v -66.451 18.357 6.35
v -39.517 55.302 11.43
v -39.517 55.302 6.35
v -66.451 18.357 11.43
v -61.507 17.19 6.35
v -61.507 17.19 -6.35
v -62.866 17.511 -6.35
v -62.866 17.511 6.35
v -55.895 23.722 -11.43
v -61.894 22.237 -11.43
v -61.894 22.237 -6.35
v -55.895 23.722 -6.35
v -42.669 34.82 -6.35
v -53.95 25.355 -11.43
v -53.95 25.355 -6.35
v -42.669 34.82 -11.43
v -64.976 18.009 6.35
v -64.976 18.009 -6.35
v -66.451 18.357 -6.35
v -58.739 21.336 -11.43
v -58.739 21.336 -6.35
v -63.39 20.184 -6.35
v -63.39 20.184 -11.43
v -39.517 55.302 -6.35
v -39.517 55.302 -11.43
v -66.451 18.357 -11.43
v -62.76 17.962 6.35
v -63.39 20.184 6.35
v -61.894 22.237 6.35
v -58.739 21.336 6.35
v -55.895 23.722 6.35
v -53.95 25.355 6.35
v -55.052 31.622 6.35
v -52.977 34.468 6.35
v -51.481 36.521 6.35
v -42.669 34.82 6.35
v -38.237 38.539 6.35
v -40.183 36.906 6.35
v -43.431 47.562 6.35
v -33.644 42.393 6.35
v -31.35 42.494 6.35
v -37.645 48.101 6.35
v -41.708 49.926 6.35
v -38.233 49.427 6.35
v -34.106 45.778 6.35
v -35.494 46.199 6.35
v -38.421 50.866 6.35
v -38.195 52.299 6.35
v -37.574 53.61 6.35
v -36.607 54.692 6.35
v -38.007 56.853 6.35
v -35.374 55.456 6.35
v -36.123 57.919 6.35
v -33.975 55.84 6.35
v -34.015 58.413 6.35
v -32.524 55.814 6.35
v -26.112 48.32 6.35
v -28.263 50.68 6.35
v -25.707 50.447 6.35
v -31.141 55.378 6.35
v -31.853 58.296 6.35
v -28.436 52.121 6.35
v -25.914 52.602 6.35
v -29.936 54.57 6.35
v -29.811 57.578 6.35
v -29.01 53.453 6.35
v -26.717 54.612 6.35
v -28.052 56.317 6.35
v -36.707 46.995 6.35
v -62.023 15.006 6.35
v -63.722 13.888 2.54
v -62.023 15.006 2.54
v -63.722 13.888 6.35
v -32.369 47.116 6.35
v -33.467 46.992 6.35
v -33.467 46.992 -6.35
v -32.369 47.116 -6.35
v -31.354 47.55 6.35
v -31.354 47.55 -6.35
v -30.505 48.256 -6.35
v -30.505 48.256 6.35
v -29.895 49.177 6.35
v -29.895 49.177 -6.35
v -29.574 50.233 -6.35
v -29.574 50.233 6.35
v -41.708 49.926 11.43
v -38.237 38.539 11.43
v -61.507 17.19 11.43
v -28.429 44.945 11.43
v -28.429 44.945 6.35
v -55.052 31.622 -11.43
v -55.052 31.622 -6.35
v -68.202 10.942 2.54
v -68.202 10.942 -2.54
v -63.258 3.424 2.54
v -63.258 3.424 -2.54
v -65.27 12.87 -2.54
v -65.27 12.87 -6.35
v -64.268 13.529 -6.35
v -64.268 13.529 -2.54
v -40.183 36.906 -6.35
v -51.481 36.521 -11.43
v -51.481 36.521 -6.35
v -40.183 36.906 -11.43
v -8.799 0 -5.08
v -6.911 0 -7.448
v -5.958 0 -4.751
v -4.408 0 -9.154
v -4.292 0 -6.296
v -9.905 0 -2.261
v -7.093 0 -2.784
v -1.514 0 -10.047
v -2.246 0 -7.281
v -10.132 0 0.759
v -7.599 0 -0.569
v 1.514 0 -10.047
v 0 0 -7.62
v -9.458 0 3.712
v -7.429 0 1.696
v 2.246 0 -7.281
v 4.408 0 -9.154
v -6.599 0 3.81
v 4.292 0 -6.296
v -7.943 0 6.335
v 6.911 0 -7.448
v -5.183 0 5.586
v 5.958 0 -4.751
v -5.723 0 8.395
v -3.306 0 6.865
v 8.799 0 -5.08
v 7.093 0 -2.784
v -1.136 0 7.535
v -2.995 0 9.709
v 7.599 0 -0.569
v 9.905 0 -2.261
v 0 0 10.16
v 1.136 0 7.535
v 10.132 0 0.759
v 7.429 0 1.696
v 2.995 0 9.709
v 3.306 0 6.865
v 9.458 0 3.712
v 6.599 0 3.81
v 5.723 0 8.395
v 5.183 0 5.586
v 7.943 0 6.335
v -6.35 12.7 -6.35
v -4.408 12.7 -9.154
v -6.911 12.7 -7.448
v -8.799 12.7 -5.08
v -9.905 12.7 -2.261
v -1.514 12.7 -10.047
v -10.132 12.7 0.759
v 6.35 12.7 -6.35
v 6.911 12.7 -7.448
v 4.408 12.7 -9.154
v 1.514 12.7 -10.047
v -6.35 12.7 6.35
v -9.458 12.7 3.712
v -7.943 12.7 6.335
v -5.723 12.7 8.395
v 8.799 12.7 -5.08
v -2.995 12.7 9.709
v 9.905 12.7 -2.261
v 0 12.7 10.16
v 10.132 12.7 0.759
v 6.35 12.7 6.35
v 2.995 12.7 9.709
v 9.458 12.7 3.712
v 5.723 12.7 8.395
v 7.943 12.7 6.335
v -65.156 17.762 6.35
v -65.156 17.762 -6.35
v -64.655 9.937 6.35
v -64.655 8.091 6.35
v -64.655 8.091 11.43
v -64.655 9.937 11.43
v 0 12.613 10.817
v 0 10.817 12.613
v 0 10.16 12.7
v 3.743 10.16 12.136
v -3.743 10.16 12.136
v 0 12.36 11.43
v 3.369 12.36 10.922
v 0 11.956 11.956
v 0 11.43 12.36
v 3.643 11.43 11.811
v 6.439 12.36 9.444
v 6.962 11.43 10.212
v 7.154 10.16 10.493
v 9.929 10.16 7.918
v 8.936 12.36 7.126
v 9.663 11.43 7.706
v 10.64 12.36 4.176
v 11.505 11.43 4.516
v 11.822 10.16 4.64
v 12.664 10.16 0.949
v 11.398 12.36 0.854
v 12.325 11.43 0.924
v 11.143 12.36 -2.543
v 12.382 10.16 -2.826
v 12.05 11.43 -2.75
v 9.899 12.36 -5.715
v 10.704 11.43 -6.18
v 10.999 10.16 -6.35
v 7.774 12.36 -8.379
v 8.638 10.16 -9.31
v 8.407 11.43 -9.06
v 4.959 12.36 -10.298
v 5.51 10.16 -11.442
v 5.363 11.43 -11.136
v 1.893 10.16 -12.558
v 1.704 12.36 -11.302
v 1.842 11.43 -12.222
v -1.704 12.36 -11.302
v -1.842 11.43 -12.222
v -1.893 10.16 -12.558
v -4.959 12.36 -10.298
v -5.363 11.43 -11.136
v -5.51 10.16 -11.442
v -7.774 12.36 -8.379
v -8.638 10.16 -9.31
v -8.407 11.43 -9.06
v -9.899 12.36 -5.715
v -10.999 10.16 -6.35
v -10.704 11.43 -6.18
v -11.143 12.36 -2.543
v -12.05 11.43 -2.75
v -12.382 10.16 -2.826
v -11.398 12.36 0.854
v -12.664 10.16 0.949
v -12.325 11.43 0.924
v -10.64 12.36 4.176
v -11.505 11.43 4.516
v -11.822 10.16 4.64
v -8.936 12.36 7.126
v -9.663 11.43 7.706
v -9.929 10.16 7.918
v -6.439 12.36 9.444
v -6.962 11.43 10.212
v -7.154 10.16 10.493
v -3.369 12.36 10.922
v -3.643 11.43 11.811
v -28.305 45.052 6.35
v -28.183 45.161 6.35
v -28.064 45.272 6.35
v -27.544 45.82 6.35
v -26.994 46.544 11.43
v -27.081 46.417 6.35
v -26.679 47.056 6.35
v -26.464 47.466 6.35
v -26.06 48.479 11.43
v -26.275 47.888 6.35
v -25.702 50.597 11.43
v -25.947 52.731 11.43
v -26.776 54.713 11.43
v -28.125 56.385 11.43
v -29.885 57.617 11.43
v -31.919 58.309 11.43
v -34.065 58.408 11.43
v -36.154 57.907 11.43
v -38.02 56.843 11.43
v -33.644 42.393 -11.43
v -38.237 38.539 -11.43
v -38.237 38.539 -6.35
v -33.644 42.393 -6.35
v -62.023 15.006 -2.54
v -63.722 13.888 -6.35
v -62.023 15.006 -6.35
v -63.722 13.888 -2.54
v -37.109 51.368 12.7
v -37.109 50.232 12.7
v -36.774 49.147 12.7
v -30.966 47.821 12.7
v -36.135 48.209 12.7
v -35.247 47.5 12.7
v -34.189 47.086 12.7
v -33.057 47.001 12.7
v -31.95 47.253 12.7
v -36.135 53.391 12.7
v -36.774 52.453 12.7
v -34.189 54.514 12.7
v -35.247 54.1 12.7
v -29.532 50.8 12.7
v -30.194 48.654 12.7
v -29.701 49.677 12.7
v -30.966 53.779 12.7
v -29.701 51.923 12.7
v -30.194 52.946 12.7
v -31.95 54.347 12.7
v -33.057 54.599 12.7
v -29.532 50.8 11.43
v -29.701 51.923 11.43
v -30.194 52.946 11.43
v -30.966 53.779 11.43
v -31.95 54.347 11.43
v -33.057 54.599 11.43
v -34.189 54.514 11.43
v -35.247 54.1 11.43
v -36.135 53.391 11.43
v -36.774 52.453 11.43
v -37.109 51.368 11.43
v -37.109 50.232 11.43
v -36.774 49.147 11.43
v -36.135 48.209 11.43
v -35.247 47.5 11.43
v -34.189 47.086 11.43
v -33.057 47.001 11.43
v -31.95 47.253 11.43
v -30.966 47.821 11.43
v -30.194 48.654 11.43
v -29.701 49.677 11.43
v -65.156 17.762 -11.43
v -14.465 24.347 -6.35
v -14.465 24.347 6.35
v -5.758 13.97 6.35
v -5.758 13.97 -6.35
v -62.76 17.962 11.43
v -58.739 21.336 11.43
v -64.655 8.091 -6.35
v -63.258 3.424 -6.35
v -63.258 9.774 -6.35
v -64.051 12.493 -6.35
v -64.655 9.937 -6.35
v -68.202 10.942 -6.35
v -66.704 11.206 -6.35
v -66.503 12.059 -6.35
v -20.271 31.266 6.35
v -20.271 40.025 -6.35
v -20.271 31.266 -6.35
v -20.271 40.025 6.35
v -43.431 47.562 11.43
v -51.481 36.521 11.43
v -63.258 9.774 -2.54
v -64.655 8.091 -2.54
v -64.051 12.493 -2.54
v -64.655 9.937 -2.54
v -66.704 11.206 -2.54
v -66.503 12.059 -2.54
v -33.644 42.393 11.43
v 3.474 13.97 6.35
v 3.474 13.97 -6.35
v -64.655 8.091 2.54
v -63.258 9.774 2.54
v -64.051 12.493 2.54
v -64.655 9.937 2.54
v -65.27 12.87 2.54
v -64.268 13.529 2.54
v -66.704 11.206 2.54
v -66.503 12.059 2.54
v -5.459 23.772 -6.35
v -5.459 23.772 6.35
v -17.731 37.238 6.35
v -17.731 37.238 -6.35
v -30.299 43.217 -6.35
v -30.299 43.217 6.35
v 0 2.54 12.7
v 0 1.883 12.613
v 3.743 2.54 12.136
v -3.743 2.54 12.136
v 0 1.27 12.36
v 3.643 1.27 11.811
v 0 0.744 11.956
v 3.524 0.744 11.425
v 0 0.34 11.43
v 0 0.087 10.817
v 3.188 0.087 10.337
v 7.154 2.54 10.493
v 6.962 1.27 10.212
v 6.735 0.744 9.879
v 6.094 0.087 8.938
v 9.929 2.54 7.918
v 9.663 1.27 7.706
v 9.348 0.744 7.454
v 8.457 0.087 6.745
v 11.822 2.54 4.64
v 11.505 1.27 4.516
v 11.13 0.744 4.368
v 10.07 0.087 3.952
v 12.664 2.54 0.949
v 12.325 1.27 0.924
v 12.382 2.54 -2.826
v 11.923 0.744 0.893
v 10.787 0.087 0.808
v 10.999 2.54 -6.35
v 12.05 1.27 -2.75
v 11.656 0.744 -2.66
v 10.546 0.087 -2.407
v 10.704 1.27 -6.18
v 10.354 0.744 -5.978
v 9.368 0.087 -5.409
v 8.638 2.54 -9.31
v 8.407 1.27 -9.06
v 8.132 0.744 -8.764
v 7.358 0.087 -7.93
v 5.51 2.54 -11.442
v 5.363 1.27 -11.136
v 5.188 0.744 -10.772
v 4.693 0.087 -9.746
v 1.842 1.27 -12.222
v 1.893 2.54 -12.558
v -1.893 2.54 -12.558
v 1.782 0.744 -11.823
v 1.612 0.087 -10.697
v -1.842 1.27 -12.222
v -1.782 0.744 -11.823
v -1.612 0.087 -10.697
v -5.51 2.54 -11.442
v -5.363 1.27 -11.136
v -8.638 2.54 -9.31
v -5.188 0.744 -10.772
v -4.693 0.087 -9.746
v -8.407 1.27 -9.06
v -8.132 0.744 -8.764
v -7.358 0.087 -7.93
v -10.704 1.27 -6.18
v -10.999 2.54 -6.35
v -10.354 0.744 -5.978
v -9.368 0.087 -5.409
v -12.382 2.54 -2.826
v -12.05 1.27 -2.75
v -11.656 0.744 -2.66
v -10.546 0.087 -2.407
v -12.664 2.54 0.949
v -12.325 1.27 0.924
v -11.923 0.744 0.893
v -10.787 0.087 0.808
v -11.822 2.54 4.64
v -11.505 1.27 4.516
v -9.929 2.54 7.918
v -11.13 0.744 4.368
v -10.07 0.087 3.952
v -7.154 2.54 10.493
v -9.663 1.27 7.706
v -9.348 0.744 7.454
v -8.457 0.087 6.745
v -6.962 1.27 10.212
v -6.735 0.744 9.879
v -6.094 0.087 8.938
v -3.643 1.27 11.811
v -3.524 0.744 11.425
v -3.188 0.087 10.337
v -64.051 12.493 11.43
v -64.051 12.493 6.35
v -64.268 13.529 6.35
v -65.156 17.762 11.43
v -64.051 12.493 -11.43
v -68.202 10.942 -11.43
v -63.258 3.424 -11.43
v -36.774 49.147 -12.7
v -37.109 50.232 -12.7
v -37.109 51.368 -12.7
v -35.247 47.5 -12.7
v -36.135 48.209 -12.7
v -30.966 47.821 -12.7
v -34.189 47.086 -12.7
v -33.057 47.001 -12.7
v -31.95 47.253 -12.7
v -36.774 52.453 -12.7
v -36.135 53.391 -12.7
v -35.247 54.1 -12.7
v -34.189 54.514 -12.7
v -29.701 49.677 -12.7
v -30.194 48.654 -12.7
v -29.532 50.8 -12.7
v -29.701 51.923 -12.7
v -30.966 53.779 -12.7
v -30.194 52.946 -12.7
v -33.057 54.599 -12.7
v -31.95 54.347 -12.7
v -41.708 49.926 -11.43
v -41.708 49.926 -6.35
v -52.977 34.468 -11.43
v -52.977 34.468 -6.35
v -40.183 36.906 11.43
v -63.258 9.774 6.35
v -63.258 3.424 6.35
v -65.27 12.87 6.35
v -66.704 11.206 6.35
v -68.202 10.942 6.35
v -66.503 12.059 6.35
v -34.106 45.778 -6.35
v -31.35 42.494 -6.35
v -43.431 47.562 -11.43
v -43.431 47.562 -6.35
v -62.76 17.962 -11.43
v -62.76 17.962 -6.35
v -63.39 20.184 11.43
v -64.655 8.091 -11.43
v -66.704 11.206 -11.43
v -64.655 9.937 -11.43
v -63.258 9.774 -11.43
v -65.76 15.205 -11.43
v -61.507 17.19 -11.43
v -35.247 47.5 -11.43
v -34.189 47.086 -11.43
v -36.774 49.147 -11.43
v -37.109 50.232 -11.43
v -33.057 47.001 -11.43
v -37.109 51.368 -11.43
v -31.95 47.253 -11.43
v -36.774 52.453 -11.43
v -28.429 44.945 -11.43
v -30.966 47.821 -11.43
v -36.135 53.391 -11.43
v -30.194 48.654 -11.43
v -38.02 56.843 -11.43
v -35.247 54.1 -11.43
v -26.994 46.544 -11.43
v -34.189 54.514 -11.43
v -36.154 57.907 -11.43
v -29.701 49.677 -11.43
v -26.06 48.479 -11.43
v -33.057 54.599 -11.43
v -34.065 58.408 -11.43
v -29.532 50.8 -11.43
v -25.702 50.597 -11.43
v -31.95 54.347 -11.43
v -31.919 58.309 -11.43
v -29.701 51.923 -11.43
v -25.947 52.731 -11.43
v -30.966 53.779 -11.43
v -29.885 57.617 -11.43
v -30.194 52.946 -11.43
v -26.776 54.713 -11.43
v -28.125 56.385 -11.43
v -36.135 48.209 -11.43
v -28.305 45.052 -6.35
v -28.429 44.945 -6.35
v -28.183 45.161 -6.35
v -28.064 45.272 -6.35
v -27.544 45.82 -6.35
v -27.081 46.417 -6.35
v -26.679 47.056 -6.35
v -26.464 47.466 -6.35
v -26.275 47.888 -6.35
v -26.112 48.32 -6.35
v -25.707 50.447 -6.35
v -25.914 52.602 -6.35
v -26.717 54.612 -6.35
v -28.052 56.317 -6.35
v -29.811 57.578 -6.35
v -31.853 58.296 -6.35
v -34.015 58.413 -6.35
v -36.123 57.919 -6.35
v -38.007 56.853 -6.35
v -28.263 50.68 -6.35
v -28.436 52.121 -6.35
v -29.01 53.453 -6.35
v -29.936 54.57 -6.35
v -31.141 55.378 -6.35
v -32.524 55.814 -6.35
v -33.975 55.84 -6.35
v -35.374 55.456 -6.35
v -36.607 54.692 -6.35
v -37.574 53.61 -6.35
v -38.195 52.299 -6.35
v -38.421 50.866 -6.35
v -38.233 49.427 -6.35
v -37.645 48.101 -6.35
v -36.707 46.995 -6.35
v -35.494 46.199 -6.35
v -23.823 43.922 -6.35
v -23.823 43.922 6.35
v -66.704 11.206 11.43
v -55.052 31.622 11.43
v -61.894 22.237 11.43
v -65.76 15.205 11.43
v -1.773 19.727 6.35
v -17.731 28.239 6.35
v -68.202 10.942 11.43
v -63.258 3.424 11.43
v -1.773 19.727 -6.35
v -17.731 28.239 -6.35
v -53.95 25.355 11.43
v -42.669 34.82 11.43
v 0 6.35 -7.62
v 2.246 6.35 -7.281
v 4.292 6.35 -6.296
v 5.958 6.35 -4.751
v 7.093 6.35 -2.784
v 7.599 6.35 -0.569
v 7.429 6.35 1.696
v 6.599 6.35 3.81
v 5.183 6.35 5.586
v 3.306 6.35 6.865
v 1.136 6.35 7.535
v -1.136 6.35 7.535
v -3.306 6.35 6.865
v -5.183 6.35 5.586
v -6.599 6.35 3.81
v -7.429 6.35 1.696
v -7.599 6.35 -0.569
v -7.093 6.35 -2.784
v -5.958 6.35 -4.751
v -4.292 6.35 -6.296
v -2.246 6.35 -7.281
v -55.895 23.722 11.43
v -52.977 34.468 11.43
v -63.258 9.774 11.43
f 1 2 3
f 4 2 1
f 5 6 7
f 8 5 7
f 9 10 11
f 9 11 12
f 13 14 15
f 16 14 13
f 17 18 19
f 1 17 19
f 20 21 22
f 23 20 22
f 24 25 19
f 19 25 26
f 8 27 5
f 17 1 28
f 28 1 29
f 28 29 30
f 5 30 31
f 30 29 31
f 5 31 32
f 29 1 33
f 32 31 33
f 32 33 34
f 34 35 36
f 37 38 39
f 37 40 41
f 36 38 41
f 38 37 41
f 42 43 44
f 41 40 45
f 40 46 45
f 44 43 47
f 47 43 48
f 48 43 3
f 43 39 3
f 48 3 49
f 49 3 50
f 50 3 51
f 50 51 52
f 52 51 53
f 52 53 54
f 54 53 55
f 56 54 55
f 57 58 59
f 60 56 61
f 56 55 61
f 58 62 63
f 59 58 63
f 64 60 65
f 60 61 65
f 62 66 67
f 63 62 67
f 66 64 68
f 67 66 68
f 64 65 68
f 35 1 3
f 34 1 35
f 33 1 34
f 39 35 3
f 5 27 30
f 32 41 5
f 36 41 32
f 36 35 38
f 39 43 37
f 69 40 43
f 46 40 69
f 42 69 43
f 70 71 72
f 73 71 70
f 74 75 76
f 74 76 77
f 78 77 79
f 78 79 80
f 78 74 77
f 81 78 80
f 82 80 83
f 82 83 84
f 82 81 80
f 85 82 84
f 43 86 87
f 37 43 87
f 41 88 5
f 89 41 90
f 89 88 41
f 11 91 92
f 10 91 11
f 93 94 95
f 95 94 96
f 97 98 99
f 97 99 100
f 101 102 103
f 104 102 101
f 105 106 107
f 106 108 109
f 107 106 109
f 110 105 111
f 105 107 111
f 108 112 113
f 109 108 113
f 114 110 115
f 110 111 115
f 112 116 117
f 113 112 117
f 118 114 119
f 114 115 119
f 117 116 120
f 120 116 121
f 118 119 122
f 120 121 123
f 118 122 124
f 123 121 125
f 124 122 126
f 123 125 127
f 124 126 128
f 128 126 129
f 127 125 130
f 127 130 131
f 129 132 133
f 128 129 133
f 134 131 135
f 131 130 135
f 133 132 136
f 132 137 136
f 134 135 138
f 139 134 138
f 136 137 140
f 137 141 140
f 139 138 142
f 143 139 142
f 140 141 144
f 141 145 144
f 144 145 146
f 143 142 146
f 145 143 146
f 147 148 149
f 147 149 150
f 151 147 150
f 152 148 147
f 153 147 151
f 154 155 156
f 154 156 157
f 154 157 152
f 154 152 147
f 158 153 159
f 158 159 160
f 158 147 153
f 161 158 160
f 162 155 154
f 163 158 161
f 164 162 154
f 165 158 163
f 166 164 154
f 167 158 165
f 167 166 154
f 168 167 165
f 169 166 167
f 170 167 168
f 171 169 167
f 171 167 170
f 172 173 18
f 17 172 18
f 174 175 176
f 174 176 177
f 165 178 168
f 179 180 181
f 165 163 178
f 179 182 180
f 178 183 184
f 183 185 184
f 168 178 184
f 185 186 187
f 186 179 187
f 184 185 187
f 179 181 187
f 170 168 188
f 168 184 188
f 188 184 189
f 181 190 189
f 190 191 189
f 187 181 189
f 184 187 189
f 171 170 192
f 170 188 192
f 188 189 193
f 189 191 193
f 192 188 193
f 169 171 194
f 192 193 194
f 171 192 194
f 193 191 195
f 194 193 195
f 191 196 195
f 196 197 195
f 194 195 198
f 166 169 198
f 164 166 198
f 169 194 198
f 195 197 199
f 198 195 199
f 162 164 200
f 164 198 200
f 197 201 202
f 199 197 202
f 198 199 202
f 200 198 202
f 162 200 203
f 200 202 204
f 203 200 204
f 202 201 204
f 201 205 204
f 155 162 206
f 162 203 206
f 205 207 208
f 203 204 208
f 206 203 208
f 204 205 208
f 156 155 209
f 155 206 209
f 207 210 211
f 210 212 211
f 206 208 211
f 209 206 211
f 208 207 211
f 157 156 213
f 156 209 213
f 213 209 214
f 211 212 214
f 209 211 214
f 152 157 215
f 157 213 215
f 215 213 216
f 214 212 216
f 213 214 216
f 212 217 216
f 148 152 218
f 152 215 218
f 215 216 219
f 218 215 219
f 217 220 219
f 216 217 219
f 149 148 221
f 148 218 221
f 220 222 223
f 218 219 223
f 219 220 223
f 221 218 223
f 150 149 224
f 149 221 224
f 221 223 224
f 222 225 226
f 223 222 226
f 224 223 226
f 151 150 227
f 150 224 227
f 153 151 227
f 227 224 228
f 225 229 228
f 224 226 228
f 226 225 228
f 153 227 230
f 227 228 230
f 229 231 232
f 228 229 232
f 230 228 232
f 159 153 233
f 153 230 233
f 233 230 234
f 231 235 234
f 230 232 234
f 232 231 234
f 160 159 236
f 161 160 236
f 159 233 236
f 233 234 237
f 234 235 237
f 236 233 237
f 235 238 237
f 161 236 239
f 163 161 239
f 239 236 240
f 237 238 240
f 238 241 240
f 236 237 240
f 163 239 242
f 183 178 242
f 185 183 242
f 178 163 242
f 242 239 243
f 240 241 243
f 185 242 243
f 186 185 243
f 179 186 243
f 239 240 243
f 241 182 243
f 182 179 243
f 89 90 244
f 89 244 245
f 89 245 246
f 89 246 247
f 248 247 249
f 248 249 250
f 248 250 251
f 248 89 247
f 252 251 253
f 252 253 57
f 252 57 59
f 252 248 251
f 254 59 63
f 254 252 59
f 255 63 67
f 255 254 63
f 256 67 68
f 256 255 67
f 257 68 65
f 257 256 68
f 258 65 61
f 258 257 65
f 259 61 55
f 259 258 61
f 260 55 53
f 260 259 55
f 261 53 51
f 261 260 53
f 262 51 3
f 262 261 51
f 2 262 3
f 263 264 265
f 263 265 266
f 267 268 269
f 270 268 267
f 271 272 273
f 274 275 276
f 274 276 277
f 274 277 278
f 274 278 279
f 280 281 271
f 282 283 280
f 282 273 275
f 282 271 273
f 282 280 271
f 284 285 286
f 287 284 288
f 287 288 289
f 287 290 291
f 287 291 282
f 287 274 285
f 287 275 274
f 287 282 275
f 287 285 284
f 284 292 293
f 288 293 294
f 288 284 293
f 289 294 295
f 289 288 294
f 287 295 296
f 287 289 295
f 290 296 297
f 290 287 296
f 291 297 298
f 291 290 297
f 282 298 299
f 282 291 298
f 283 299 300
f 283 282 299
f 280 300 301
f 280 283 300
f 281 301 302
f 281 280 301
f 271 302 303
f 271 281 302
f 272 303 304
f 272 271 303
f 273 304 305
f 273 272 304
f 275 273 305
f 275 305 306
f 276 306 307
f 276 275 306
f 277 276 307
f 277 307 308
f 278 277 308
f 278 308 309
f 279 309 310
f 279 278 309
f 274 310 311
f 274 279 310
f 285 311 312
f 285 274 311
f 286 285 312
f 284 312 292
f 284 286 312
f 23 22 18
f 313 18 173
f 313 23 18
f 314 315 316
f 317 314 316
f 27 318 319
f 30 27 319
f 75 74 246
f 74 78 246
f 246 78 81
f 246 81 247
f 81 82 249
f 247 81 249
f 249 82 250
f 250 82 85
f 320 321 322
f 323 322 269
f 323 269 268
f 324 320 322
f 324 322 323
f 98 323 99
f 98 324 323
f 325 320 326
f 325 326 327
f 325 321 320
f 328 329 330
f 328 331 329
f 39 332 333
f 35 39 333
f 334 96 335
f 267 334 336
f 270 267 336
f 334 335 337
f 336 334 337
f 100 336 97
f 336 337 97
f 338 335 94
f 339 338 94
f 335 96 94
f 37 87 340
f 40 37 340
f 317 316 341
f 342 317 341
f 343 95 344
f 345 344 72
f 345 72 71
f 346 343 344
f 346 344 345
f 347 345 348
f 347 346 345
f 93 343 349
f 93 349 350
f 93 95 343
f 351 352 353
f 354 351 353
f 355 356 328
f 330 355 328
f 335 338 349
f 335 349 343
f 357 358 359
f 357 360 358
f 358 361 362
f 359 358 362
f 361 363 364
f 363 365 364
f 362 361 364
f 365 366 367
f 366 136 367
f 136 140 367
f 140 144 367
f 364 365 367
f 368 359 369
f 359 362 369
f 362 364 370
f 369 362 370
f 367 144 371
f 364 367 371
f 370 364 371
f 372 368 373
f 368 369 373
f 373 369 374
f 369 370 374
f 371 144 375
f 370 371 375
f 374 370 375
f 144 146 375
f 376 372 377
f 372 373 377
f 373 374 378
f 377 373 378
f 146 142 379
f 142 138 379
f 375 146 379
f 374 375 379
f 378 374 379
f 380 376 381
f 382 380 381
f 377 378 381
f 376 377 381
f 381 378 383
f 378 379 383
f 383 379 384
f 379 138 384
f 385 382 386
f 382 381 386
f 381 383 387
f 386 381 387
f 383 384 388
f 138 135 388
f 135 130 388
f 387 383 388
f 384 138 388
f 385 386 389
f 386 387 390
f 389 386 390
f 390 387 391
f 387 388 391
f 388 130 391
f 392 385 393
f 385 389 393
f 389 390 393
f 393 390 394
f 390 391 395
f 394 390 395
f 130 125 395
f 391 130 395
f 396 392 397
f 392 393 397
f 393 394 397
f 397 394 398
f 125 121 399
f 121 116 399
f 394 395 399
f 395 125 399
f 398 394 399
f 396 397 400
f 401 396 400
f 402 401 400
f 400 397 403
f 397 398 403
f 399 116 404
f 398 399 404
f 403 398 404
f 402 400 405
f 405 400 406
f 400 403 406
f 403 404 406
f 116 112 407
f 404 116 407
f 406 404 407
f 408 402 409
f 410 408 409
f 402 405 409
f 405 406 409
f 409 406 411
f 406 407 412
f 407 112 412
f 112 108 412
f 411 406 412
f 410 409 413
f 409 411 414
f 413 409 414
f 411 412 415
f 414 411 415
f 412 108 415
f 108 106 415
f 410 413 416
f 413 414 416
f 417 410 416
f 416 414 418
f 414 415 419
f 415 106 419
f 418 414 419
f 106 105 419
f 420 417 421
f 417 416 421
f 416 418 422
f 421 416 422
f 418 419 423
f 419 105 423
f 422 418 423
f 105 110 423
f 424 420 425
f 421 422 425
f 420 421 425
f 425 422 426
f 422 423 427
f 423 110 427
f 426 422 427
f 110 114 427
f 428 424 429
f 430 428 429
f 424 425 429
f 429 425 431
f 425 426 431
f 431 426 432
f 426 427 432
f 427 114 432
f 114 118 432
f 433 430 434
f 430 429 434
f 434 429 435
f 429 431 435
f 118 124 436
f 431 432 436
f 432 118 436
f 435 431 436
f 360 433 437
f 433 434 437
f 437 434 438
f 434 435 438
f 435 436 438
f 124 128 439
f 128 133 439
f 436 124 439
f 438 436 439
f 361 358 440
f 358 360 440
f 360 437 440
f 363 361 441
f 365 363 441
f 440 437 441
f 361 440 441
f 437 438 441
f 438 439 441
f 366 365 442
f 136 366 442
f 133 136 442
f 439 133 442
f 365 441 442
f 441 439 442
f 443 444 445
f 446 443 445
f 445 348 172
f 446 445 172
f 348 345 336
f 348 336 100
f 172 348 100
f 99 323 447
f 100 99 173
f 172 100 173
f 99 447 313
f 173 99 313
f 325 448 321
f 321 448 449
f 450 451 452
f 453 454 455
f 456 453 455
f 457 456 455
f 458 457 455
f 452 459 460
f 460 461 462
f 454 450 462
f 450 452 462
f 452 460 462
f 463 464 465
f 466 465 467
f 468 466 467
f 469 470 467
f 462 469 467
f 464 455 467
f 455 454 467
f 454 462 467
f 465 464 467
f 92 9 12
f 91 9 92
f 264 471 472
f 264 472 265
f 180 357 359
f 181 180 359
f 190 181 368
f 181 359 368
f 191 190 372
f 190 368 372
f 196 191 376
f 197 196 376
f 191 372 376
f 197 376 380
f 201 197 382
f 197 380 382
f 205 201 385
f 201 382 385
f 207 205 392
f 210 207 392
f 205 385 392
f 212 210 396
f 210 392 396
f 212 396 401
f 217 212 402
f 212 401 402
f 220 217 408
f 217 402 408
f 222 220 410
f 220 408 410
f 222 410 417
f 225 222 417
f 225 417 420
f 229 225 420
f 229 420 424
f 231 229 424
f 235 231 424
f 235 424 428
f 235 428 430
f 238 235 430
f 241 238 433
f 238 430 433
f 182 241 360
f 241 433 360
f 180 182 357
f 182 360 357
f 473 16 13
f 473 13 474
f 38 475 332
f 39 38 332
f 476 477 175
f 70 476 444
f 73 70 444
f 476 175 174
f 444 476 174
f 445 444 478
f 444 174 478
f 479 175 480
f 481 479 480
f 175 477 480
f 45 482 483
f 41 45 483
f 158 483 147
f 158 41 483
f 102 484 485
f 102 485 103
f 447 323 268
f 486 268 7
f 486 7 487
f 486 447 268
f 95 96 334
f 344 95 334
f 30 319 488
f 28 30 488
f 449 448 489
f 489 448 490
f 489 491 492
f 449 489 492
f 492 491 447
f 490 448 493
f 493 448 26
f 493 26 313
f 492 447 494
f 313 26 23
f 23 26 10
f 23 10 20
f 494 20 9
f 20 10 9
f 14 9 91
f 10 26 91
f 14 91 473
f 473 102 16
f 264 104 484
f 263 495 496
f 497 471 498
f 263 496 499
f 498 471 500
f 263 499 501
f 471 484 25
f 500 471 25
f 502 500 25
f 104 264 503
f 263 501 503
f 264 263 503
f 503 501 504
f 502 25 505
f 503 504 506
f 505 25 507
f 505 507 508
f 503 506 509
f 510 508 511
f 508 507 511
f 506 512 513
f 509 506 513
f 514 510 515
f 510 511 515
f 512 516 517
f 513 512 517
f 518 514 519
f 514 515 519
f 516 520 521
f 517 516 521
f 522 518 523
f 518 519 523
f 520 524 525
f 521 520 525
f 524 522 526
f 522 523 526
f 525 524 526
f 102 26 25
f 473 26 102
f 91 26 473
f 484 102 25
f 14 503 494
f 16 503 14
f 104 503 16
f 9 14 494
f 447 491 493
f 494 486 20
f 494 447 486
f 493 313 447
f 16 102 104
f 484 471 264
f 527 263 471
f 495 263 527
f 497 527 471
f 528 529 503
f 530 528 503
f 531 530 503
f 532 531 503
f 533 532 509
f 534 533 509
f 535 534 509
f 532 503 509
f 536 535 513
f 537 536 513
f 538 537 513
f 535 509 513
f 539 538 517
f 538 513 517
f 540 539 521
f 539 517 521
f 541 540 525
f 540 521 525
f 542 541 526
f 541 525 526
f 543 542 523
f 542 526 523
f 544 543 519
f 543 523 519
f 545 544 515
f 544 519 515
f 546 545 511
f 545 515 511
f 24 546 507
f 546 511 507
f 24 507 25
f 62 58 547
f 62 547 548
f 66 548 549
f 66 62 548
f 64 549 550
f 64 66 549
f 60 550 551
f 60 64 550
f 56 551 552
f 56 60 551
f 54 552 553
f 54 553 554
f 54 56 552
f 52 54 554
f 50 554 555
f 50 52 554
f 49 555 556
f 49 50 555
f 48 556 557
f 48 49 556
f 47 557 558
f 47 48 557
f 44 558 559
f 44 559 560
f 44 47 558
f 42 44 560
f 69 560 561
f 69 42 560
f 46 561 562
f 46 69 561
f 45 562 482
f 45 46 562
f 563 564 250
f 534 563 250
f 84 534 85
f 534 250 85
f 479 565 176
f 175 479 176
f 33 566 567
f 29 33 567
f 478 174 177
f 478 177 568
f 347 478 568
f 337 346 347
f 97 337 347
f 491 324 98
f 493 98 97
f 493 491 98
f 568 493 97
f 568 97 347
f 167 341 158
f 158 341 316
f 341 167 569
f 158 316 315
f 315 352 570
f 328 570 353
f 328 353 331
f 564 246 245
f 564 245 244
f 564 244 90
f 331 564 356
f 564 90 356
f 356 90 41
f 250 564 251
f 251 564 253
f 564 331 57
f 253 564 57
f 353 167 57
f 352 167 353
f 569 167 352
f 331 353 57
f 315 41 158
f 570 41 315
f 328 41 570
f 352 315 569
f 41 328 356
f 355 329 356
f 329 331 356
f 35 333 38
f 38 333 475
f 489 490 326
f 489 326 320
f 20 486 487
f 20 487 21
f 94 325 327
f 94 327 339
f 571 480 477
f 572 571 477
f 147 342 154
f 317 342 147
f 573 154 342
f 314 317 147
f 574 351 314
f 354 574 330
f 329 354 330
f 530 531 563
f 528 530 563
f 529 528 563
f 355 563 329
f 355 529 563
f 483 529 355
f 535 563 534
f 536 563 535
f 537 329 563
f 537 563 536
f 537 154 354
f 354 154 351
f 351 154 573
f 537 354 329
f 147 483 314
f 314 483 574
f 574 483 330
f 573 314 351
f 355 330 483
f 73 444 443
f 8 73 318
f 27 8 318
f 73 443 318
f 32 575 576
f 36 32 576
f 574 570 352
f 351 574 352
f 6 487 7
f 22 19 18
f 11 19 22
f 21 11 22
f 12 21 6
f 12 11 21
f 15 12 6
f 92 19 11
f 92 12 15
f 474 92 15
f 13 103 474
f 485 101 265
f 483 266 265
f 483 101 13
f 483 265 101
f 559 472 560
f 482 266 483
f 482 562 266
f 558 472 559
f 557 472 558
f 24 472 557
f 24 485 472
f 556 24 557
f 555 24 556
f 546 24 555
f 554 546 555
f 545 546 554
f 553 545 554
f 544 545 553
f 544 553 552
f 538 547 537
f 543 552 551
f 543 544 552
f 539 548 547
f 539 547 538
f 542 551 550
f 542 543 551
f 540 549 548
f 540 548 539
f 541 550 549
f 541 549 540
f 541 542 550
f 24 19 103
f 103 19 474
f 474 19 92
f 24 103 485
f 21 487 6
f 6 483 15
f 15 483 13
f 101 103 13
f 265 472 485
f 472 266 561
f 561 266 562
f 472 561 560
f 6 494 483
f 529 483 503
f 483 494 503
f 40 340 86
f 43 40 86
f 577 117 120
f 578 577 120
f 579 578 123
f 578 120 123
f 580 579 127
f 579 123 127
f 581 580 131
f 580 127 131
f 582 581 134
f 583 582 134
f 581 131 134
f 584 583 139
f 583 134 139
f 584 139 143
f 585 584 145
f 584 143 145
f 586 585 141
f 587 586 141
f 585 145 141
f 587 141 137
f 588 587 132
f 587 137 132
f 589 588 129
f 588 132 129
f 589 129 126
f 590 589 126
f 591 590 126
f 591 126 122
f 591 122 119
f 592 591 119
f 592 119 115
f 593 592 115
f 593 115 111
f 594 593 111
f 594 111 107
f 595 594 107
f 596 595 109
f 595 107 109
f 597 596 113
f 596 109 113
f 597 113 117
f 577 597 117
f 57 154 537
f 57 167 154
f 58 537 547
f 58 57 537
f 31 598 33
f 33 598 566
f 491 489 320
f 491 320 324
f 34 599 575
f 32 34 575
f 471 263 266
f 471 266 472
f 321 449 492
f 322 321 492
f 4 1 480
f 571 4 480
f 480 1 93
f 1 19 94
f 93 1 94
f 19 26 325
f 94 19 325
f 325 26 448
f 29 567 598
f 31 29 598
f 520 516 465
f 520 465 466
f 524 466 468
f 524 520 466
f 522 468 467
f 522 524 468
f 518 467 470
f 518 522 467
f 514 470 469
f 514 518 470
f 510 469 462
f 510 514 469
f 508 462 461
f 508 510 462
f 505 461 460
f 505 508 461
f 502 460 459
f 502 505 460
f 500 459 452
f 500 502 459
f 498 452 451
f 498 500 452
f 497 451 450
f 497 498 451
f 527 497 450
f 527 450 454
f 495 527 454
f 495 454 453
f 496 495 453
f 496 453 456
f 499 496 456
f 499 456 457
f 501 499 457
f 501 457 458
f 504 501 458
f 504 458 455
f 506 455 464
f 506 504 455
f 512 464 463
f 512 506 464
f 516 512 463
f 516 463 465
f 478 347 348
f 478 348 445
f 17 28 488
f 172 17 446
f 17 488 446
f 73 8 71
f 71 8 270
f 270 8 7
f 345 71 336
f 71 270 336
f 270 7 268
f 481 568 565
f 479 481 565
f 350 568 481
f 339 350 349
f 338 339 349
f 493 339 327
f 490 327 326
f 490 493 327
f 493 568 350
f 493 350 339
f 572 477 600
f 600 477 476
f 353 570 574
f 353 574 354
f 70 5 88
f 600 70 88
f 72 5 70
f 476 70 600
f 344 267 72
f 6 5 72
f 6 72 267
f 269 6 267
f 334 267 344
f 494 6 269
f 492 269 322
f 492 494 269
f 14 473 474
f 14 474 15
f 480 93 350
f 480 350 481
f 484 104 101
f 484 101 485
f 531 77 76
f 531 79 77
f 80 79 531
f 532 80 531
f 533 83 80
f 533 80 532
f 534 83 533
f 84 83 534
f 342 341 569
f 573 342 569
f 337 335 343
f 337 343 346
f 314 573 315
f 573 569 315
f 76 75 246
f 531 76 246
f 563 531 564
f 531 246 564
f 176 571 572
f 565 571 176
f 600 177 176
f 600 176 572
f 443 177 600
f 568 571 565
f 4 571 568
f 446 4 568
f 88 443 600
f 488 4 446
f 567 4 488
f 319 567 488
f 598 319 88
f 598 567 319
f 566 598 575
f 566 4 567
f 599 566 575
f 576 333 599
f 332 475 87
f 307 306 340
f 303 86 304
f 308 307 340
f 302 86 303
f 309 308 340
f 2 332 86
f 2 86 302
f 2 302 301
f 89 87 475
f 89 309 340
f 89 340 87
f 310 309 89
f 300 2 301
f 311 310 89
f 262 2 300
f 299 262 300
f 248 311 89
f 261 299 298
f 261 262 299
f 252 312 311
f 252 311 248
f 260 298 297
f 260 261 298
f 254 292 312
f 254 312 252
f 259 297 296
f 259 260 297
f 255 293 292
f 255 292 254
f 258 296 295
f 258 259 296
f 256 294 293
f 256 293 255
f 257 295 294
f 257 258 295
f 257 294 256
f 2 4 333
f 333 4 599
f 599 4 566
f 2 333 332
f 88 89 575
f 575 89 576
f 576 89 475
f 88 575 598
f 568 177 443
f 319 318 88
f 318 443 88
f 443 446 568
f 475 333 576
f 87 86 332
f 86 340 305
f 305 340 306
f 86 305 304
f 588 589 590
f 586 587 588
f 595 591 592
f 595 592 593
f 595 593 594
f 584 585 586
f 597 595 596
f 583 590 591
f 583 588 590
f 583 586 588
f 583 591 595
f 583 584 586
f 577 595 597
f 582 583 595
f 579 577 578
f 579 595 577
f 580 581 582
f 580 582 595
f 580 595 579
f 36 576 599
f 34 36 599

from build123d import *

# Parameters (mm, degrees)
SKETCH2_R            = 12.7
BOSS_EXTRUDE1_DEPTH  = 12.7
BOSS_EXTRUDE2_DEPTH  = 6.35
CUT_EXTRUDE1_START   = -6.35
CUT_EXTRUDE1_DEPTH   = 7.62
BOSS_EXTRUDE3_DEPTH  = 6.35
SKETCH6_R            = 3.81
BOSS_EXTRUDE4_DEPTH  = 12.7
BOSS_EXTRUDE5_START  = -1.27
SKETCH7_R            = 7.64274541
SKETCH7_R_2          = 3.81
BOSS_EXTRUDE5_DEPTH  = 5.08
CUT_EXTRUDE2_DEPTH   = 94.001963864
SKETCH14_R           = 7.62
CUT_EXTRUDE3_DEPTH   = 6.35
BOSS_EXTRUDE12_REACH = 93.815
FILLET1_R            = 2.54
CUT_EXTRUDE5_REACH   = 105.401
SKETCH16_W           = 3.81
SKETCH16_H           = 8.99772588


with BuildPart() as part:
    # Sketch2 → Boss-Extrude1 (new body)
    with BuildSketch(Plane(origin=(0, 0, 0), x_dir=(1, 0, 0), z_dir=(0, 1, 0))):
        with Locations(Location((0, 0, 0), (0, 0, 270))):
            Circle(SKETCH2_R)
    extrude(amount=BOSS_EXTRUDE1_DEPTH)

    # Sketch3 → Boss-Extrude2 (add, symmetric)
    with BuildSketch(Plane.XY):
        with BuildLine():
            Line((6.35, 12.7), (-28.263014494, 50.680235189))
            ThreePointArc((-28.263014494, 50.680235189), (-36.606963582, 54.691505771), (-34.105544768, 45.777770191))
            Line((-34.105544768, 45.777770191), (-6.35, 12.7))
            Line((-6.35, 12.7), (6.35, 12.7))
        make_face()
    extrude(amount=BOSS_EXTRUDE2_DEPTH, both=True)

    # Sketch4 → Cut-Extrude1 (cut, symmetric)
    with BuildSketch(Plane.XY.offset(6.35).offset(CUT_EXTRUDE1_START)):
        with BuildLine():
            Line((-5.757789274, 13.97), (3.474314319, 13.97))
            Line((3.474314319, 13.97), (-29.573983747, 50.233300134))
            ThreePointArc((-29.573983747, 50.233300134), (-35.779559637, 53.727877238), (-33.46657952, 46.992050322))
            Line((-33.46657952, 46.992050322), (-5.757789274, 13.97))
        make_face()
    extrude(amount=CUT_EXTRUDE1_DEPTH, both=True, mode=Mode.SUBTRACT)

    # Sketch5 → Boss-Extrude3 (add, symmetric)
    with BuildSketch(Plane.XY):
        Polygon((-23.82267484, 43.922492823), (-20.27066661, 40.024938393), (-30.298747694, 43.216775363), (-33.46657952, 46.992050322), align=None)
        Polygon((-20.27066661, 40.024938393), (-20.27066661, 31.265773704), (-17.73066661, 28.238719579), (-17.73066661, 37.237842303), align=None)
        Polygon((-5.458773455, 23.772115752), (-1.772739842, 19.727497693), (-14.465305553, 24.347213808), (-17.73066661, 28.238719579), align=None)
    extrude(amount=BOSS_EXTRUDE3_DEPTH, both=True)

    # Sketch6 → Boss-Extrude4 (add, symmetric)
    with BuildSketch(Plane.XY):
        with Locations((-33.341602525, 50.8)):
            Circle(SKETCH6_R)
    extrude(amount=BOSS_EXTRUDE4_DEPTH, both=True)

    # Sketch7 → Boss-Extrude5 (add)
    # profile 1 of 4: a face of its own
    with BuildSketch(Plane.XY.offset(12.7).offset(BOSS_EXTRUDE5_START)):
        with Locations((-33.341602525, 50.8)):
            Circle(SKETCH7_R)
        with Locations(Location((-33.341602525, 50.8, 0), (0, 0, 268.120225958))):
            Circle(SKETCH7_R_2, mode=Mode.SUBTRACT)
    # profile 2 of 4: a face of its own
    with BuildSketch(Plane.XY.offset(12.7).offset(BOSS_EXTRUDE5_START)):
        with BuildLine():
            ThreePointArc((-28.428940471, 44.945317348), (-38.558455358, 45.2146617), (-39.517448502, 55.302275411))
            Line((-39.517448502, 55.302275411), (-66.450706217, 18.357478363))
            Line((-66.450706217, 18.357478363), (-61.506739525, 17.189748362))
            Line((-61.506739525, 17.189748362), (-28.428940471, 44.945317348))
        make_face()
    # profile 3 of 4: a face of its own
    with BuildSketch(Plane.XY.offset(12.7).offset(BOSS_EXTRUDE5_START)):
        Polygon((-61.506739525, 17.189748362), (-63.258334527, 9.773798325), (-68.202301218, 10.941528326), (-66.450706217, 18.357478363), align=None)
    # profile 4 of 4: a face of its own
    with BuildSketch(Plane.XY.offset(12.7).offset(BOSS_EXTRUDE5_START)):
        Polygon((-68.202301218, 10.941528326), (-63.258334527, 3.423798325), (-63.258334527, 9.773798325), align=None)
    extrude(amount=-BOSS_EXTRUDE5_DEPTH)

    # Sketch10 → Cut-Extrude2 (cut, through all)
    with BuildSketch(Plane.XY.offset(11.43)):
        Polygon((-43.431264654, 47.562180038), (-51.48051274, 36.520892717), (-40.182838097, 36.906280169), align=None)
        Polygon((-52.976804835, 34.468403992), (-53.949591662, 25.35460233), (-42.669146252, 34.820019913), align=None)
        Polygon((-55.05214832, 31.621620856), (-61.893965932, 22.236585976), (-55.895344547, 23.721921802), align=None)
        Polygon((-64.655334527, 9.936540168), (-65.75979615, 15.205273966), (-66.70434579, 11.206214291), (-64.655334527, 8.090515014), align=None)
        Polygon((-63.390258027, 20.184097251), (-65.155875161, 17.762170896), (-64.051413538, 12.493437098), (-62.759783939, 17.96197324), (-58.739005045, 21.335807327), align=None)
        Polygon((-41.708282924, 49.925622701), (-38.237085212, 38.538960697), (-33.643800576, 42.393184141), align=None)
    extrude(amount=-CUT_EXTRUDE2_DEPTH, mode=Mode.SUBTRACT)

    # Mirror1: part across plane


with BuildPart() as part_1:
    add(part.part)
    add(part.part.mirror(Plane.XY))

    # Sketch14 → Cut-Extrude3 (cut)
    with BuildSketch(Plane.XZ):
        with Locations(Location((0, 0, 0), (0, 0, 270))):
            Circle(SKETCH14_R)
    extrude(amount=-CUT_EXTRUDE3_DEPTH, mode=Mode.SUBTRACT)

    # Sketch15 → Boss-Extrude12 (add, up to next)
    with BuildSketch(Plane.XY.offset(-6.35), mode=Mode.PRIVATE) as boss_extrude12_sk1:
        Polygon((-64.9758417, 18.009125785), (-66.450706217, 18.357478363), (-68.202301218, 10.941528326), (-63.258334527, 3.423798325), (-63.258334527, 9.773798325), (-61.506739525, 17.189748362), (-62.866330365, 17.510874112), (-64.051413538, 12.493437098), (-65.155875161, 17.762170896), align=None)
        Polygon((-64.655334527, 8.090515014), (-66.70434579, 11.206214291), (-65.75979615, 15.205273966), (-64.655334527, 9.936540168), align=None, mode=Mode.SUBTRACT)
    boss_extrude12_tool1 = extrude(boss_extrude12_sk1.sketch, amount=BOSS_EXTRUDE12_REACH, mode=Mode.PRIVATE) - part_1.part
    add(boss_extrude12_tool1.solids().sort_by_distance((-64.87727, 11.921902, -6.35))[0])

    # Fillet1
    fillet1_edges = [part_1.edges().sort_by_distance(p)[0] for p in [
        (0, 0, -12.7),
        (0, 12.7, -12.7),
    ]]
    fillet(fillet1_edges, radius=FILLET1_R)

    # Sketch16 → Cut-Extrude5 (cut, up to next)
    with BuildSketch(Plane(origin=(-42.587828759, -28.007497849, 0), x_dir=(0, 0, 1), z_dir=(-0.835514451237255, -0.54946847204704, 0)), mode=Mode.PRIVATE) as cut_extrude5_sk1:
        with Locations((-4.445, 42.117956336)):
            Rectangle(SKETCH16_W, SKETCH16_H)
    cut_extrude5_tool1 = extrude(cut_extrude5_sk1.sketch, amount=-CUT_EXTRUDE5_REACH, mode=Mode.PRIVATE) & part_1.part
    # Sketch16 → Cut-Extrude5 (cut, up to next)
    with BuildSketch(Plane(origin=(-42.587828759, -28.007497849, 0), x_dir=(0, 0, 1), z_dir=(-0.835514451237255, -0.54946847204704, 0)), mode=Mode.PRIVATE) as cut_extrude5_sk2:
        with Locations((4.445, 42.117956336)):
            Rectangle(SKETCH16_W, SKETCH16_H)
    cut_extrude5_tool2 = extrude(cut_extrude5_sk2.sketch, amount=-CUT_EXTRUDE5_REACH, mode=Mode.PRIVATE) & part_1.part
    add(cut_extrude5_tool1.solids().sort_by_distance((-65.730318, 7.182663, -4.445))[0], mode=Mode.SUBTRACT)
    add(cut_extrude5_tool2.solids().sort_by_distance((-65.730318, 7.182663, 4.445))[0], mode=Mode.SUBTRACT)


solid = part_1.part
